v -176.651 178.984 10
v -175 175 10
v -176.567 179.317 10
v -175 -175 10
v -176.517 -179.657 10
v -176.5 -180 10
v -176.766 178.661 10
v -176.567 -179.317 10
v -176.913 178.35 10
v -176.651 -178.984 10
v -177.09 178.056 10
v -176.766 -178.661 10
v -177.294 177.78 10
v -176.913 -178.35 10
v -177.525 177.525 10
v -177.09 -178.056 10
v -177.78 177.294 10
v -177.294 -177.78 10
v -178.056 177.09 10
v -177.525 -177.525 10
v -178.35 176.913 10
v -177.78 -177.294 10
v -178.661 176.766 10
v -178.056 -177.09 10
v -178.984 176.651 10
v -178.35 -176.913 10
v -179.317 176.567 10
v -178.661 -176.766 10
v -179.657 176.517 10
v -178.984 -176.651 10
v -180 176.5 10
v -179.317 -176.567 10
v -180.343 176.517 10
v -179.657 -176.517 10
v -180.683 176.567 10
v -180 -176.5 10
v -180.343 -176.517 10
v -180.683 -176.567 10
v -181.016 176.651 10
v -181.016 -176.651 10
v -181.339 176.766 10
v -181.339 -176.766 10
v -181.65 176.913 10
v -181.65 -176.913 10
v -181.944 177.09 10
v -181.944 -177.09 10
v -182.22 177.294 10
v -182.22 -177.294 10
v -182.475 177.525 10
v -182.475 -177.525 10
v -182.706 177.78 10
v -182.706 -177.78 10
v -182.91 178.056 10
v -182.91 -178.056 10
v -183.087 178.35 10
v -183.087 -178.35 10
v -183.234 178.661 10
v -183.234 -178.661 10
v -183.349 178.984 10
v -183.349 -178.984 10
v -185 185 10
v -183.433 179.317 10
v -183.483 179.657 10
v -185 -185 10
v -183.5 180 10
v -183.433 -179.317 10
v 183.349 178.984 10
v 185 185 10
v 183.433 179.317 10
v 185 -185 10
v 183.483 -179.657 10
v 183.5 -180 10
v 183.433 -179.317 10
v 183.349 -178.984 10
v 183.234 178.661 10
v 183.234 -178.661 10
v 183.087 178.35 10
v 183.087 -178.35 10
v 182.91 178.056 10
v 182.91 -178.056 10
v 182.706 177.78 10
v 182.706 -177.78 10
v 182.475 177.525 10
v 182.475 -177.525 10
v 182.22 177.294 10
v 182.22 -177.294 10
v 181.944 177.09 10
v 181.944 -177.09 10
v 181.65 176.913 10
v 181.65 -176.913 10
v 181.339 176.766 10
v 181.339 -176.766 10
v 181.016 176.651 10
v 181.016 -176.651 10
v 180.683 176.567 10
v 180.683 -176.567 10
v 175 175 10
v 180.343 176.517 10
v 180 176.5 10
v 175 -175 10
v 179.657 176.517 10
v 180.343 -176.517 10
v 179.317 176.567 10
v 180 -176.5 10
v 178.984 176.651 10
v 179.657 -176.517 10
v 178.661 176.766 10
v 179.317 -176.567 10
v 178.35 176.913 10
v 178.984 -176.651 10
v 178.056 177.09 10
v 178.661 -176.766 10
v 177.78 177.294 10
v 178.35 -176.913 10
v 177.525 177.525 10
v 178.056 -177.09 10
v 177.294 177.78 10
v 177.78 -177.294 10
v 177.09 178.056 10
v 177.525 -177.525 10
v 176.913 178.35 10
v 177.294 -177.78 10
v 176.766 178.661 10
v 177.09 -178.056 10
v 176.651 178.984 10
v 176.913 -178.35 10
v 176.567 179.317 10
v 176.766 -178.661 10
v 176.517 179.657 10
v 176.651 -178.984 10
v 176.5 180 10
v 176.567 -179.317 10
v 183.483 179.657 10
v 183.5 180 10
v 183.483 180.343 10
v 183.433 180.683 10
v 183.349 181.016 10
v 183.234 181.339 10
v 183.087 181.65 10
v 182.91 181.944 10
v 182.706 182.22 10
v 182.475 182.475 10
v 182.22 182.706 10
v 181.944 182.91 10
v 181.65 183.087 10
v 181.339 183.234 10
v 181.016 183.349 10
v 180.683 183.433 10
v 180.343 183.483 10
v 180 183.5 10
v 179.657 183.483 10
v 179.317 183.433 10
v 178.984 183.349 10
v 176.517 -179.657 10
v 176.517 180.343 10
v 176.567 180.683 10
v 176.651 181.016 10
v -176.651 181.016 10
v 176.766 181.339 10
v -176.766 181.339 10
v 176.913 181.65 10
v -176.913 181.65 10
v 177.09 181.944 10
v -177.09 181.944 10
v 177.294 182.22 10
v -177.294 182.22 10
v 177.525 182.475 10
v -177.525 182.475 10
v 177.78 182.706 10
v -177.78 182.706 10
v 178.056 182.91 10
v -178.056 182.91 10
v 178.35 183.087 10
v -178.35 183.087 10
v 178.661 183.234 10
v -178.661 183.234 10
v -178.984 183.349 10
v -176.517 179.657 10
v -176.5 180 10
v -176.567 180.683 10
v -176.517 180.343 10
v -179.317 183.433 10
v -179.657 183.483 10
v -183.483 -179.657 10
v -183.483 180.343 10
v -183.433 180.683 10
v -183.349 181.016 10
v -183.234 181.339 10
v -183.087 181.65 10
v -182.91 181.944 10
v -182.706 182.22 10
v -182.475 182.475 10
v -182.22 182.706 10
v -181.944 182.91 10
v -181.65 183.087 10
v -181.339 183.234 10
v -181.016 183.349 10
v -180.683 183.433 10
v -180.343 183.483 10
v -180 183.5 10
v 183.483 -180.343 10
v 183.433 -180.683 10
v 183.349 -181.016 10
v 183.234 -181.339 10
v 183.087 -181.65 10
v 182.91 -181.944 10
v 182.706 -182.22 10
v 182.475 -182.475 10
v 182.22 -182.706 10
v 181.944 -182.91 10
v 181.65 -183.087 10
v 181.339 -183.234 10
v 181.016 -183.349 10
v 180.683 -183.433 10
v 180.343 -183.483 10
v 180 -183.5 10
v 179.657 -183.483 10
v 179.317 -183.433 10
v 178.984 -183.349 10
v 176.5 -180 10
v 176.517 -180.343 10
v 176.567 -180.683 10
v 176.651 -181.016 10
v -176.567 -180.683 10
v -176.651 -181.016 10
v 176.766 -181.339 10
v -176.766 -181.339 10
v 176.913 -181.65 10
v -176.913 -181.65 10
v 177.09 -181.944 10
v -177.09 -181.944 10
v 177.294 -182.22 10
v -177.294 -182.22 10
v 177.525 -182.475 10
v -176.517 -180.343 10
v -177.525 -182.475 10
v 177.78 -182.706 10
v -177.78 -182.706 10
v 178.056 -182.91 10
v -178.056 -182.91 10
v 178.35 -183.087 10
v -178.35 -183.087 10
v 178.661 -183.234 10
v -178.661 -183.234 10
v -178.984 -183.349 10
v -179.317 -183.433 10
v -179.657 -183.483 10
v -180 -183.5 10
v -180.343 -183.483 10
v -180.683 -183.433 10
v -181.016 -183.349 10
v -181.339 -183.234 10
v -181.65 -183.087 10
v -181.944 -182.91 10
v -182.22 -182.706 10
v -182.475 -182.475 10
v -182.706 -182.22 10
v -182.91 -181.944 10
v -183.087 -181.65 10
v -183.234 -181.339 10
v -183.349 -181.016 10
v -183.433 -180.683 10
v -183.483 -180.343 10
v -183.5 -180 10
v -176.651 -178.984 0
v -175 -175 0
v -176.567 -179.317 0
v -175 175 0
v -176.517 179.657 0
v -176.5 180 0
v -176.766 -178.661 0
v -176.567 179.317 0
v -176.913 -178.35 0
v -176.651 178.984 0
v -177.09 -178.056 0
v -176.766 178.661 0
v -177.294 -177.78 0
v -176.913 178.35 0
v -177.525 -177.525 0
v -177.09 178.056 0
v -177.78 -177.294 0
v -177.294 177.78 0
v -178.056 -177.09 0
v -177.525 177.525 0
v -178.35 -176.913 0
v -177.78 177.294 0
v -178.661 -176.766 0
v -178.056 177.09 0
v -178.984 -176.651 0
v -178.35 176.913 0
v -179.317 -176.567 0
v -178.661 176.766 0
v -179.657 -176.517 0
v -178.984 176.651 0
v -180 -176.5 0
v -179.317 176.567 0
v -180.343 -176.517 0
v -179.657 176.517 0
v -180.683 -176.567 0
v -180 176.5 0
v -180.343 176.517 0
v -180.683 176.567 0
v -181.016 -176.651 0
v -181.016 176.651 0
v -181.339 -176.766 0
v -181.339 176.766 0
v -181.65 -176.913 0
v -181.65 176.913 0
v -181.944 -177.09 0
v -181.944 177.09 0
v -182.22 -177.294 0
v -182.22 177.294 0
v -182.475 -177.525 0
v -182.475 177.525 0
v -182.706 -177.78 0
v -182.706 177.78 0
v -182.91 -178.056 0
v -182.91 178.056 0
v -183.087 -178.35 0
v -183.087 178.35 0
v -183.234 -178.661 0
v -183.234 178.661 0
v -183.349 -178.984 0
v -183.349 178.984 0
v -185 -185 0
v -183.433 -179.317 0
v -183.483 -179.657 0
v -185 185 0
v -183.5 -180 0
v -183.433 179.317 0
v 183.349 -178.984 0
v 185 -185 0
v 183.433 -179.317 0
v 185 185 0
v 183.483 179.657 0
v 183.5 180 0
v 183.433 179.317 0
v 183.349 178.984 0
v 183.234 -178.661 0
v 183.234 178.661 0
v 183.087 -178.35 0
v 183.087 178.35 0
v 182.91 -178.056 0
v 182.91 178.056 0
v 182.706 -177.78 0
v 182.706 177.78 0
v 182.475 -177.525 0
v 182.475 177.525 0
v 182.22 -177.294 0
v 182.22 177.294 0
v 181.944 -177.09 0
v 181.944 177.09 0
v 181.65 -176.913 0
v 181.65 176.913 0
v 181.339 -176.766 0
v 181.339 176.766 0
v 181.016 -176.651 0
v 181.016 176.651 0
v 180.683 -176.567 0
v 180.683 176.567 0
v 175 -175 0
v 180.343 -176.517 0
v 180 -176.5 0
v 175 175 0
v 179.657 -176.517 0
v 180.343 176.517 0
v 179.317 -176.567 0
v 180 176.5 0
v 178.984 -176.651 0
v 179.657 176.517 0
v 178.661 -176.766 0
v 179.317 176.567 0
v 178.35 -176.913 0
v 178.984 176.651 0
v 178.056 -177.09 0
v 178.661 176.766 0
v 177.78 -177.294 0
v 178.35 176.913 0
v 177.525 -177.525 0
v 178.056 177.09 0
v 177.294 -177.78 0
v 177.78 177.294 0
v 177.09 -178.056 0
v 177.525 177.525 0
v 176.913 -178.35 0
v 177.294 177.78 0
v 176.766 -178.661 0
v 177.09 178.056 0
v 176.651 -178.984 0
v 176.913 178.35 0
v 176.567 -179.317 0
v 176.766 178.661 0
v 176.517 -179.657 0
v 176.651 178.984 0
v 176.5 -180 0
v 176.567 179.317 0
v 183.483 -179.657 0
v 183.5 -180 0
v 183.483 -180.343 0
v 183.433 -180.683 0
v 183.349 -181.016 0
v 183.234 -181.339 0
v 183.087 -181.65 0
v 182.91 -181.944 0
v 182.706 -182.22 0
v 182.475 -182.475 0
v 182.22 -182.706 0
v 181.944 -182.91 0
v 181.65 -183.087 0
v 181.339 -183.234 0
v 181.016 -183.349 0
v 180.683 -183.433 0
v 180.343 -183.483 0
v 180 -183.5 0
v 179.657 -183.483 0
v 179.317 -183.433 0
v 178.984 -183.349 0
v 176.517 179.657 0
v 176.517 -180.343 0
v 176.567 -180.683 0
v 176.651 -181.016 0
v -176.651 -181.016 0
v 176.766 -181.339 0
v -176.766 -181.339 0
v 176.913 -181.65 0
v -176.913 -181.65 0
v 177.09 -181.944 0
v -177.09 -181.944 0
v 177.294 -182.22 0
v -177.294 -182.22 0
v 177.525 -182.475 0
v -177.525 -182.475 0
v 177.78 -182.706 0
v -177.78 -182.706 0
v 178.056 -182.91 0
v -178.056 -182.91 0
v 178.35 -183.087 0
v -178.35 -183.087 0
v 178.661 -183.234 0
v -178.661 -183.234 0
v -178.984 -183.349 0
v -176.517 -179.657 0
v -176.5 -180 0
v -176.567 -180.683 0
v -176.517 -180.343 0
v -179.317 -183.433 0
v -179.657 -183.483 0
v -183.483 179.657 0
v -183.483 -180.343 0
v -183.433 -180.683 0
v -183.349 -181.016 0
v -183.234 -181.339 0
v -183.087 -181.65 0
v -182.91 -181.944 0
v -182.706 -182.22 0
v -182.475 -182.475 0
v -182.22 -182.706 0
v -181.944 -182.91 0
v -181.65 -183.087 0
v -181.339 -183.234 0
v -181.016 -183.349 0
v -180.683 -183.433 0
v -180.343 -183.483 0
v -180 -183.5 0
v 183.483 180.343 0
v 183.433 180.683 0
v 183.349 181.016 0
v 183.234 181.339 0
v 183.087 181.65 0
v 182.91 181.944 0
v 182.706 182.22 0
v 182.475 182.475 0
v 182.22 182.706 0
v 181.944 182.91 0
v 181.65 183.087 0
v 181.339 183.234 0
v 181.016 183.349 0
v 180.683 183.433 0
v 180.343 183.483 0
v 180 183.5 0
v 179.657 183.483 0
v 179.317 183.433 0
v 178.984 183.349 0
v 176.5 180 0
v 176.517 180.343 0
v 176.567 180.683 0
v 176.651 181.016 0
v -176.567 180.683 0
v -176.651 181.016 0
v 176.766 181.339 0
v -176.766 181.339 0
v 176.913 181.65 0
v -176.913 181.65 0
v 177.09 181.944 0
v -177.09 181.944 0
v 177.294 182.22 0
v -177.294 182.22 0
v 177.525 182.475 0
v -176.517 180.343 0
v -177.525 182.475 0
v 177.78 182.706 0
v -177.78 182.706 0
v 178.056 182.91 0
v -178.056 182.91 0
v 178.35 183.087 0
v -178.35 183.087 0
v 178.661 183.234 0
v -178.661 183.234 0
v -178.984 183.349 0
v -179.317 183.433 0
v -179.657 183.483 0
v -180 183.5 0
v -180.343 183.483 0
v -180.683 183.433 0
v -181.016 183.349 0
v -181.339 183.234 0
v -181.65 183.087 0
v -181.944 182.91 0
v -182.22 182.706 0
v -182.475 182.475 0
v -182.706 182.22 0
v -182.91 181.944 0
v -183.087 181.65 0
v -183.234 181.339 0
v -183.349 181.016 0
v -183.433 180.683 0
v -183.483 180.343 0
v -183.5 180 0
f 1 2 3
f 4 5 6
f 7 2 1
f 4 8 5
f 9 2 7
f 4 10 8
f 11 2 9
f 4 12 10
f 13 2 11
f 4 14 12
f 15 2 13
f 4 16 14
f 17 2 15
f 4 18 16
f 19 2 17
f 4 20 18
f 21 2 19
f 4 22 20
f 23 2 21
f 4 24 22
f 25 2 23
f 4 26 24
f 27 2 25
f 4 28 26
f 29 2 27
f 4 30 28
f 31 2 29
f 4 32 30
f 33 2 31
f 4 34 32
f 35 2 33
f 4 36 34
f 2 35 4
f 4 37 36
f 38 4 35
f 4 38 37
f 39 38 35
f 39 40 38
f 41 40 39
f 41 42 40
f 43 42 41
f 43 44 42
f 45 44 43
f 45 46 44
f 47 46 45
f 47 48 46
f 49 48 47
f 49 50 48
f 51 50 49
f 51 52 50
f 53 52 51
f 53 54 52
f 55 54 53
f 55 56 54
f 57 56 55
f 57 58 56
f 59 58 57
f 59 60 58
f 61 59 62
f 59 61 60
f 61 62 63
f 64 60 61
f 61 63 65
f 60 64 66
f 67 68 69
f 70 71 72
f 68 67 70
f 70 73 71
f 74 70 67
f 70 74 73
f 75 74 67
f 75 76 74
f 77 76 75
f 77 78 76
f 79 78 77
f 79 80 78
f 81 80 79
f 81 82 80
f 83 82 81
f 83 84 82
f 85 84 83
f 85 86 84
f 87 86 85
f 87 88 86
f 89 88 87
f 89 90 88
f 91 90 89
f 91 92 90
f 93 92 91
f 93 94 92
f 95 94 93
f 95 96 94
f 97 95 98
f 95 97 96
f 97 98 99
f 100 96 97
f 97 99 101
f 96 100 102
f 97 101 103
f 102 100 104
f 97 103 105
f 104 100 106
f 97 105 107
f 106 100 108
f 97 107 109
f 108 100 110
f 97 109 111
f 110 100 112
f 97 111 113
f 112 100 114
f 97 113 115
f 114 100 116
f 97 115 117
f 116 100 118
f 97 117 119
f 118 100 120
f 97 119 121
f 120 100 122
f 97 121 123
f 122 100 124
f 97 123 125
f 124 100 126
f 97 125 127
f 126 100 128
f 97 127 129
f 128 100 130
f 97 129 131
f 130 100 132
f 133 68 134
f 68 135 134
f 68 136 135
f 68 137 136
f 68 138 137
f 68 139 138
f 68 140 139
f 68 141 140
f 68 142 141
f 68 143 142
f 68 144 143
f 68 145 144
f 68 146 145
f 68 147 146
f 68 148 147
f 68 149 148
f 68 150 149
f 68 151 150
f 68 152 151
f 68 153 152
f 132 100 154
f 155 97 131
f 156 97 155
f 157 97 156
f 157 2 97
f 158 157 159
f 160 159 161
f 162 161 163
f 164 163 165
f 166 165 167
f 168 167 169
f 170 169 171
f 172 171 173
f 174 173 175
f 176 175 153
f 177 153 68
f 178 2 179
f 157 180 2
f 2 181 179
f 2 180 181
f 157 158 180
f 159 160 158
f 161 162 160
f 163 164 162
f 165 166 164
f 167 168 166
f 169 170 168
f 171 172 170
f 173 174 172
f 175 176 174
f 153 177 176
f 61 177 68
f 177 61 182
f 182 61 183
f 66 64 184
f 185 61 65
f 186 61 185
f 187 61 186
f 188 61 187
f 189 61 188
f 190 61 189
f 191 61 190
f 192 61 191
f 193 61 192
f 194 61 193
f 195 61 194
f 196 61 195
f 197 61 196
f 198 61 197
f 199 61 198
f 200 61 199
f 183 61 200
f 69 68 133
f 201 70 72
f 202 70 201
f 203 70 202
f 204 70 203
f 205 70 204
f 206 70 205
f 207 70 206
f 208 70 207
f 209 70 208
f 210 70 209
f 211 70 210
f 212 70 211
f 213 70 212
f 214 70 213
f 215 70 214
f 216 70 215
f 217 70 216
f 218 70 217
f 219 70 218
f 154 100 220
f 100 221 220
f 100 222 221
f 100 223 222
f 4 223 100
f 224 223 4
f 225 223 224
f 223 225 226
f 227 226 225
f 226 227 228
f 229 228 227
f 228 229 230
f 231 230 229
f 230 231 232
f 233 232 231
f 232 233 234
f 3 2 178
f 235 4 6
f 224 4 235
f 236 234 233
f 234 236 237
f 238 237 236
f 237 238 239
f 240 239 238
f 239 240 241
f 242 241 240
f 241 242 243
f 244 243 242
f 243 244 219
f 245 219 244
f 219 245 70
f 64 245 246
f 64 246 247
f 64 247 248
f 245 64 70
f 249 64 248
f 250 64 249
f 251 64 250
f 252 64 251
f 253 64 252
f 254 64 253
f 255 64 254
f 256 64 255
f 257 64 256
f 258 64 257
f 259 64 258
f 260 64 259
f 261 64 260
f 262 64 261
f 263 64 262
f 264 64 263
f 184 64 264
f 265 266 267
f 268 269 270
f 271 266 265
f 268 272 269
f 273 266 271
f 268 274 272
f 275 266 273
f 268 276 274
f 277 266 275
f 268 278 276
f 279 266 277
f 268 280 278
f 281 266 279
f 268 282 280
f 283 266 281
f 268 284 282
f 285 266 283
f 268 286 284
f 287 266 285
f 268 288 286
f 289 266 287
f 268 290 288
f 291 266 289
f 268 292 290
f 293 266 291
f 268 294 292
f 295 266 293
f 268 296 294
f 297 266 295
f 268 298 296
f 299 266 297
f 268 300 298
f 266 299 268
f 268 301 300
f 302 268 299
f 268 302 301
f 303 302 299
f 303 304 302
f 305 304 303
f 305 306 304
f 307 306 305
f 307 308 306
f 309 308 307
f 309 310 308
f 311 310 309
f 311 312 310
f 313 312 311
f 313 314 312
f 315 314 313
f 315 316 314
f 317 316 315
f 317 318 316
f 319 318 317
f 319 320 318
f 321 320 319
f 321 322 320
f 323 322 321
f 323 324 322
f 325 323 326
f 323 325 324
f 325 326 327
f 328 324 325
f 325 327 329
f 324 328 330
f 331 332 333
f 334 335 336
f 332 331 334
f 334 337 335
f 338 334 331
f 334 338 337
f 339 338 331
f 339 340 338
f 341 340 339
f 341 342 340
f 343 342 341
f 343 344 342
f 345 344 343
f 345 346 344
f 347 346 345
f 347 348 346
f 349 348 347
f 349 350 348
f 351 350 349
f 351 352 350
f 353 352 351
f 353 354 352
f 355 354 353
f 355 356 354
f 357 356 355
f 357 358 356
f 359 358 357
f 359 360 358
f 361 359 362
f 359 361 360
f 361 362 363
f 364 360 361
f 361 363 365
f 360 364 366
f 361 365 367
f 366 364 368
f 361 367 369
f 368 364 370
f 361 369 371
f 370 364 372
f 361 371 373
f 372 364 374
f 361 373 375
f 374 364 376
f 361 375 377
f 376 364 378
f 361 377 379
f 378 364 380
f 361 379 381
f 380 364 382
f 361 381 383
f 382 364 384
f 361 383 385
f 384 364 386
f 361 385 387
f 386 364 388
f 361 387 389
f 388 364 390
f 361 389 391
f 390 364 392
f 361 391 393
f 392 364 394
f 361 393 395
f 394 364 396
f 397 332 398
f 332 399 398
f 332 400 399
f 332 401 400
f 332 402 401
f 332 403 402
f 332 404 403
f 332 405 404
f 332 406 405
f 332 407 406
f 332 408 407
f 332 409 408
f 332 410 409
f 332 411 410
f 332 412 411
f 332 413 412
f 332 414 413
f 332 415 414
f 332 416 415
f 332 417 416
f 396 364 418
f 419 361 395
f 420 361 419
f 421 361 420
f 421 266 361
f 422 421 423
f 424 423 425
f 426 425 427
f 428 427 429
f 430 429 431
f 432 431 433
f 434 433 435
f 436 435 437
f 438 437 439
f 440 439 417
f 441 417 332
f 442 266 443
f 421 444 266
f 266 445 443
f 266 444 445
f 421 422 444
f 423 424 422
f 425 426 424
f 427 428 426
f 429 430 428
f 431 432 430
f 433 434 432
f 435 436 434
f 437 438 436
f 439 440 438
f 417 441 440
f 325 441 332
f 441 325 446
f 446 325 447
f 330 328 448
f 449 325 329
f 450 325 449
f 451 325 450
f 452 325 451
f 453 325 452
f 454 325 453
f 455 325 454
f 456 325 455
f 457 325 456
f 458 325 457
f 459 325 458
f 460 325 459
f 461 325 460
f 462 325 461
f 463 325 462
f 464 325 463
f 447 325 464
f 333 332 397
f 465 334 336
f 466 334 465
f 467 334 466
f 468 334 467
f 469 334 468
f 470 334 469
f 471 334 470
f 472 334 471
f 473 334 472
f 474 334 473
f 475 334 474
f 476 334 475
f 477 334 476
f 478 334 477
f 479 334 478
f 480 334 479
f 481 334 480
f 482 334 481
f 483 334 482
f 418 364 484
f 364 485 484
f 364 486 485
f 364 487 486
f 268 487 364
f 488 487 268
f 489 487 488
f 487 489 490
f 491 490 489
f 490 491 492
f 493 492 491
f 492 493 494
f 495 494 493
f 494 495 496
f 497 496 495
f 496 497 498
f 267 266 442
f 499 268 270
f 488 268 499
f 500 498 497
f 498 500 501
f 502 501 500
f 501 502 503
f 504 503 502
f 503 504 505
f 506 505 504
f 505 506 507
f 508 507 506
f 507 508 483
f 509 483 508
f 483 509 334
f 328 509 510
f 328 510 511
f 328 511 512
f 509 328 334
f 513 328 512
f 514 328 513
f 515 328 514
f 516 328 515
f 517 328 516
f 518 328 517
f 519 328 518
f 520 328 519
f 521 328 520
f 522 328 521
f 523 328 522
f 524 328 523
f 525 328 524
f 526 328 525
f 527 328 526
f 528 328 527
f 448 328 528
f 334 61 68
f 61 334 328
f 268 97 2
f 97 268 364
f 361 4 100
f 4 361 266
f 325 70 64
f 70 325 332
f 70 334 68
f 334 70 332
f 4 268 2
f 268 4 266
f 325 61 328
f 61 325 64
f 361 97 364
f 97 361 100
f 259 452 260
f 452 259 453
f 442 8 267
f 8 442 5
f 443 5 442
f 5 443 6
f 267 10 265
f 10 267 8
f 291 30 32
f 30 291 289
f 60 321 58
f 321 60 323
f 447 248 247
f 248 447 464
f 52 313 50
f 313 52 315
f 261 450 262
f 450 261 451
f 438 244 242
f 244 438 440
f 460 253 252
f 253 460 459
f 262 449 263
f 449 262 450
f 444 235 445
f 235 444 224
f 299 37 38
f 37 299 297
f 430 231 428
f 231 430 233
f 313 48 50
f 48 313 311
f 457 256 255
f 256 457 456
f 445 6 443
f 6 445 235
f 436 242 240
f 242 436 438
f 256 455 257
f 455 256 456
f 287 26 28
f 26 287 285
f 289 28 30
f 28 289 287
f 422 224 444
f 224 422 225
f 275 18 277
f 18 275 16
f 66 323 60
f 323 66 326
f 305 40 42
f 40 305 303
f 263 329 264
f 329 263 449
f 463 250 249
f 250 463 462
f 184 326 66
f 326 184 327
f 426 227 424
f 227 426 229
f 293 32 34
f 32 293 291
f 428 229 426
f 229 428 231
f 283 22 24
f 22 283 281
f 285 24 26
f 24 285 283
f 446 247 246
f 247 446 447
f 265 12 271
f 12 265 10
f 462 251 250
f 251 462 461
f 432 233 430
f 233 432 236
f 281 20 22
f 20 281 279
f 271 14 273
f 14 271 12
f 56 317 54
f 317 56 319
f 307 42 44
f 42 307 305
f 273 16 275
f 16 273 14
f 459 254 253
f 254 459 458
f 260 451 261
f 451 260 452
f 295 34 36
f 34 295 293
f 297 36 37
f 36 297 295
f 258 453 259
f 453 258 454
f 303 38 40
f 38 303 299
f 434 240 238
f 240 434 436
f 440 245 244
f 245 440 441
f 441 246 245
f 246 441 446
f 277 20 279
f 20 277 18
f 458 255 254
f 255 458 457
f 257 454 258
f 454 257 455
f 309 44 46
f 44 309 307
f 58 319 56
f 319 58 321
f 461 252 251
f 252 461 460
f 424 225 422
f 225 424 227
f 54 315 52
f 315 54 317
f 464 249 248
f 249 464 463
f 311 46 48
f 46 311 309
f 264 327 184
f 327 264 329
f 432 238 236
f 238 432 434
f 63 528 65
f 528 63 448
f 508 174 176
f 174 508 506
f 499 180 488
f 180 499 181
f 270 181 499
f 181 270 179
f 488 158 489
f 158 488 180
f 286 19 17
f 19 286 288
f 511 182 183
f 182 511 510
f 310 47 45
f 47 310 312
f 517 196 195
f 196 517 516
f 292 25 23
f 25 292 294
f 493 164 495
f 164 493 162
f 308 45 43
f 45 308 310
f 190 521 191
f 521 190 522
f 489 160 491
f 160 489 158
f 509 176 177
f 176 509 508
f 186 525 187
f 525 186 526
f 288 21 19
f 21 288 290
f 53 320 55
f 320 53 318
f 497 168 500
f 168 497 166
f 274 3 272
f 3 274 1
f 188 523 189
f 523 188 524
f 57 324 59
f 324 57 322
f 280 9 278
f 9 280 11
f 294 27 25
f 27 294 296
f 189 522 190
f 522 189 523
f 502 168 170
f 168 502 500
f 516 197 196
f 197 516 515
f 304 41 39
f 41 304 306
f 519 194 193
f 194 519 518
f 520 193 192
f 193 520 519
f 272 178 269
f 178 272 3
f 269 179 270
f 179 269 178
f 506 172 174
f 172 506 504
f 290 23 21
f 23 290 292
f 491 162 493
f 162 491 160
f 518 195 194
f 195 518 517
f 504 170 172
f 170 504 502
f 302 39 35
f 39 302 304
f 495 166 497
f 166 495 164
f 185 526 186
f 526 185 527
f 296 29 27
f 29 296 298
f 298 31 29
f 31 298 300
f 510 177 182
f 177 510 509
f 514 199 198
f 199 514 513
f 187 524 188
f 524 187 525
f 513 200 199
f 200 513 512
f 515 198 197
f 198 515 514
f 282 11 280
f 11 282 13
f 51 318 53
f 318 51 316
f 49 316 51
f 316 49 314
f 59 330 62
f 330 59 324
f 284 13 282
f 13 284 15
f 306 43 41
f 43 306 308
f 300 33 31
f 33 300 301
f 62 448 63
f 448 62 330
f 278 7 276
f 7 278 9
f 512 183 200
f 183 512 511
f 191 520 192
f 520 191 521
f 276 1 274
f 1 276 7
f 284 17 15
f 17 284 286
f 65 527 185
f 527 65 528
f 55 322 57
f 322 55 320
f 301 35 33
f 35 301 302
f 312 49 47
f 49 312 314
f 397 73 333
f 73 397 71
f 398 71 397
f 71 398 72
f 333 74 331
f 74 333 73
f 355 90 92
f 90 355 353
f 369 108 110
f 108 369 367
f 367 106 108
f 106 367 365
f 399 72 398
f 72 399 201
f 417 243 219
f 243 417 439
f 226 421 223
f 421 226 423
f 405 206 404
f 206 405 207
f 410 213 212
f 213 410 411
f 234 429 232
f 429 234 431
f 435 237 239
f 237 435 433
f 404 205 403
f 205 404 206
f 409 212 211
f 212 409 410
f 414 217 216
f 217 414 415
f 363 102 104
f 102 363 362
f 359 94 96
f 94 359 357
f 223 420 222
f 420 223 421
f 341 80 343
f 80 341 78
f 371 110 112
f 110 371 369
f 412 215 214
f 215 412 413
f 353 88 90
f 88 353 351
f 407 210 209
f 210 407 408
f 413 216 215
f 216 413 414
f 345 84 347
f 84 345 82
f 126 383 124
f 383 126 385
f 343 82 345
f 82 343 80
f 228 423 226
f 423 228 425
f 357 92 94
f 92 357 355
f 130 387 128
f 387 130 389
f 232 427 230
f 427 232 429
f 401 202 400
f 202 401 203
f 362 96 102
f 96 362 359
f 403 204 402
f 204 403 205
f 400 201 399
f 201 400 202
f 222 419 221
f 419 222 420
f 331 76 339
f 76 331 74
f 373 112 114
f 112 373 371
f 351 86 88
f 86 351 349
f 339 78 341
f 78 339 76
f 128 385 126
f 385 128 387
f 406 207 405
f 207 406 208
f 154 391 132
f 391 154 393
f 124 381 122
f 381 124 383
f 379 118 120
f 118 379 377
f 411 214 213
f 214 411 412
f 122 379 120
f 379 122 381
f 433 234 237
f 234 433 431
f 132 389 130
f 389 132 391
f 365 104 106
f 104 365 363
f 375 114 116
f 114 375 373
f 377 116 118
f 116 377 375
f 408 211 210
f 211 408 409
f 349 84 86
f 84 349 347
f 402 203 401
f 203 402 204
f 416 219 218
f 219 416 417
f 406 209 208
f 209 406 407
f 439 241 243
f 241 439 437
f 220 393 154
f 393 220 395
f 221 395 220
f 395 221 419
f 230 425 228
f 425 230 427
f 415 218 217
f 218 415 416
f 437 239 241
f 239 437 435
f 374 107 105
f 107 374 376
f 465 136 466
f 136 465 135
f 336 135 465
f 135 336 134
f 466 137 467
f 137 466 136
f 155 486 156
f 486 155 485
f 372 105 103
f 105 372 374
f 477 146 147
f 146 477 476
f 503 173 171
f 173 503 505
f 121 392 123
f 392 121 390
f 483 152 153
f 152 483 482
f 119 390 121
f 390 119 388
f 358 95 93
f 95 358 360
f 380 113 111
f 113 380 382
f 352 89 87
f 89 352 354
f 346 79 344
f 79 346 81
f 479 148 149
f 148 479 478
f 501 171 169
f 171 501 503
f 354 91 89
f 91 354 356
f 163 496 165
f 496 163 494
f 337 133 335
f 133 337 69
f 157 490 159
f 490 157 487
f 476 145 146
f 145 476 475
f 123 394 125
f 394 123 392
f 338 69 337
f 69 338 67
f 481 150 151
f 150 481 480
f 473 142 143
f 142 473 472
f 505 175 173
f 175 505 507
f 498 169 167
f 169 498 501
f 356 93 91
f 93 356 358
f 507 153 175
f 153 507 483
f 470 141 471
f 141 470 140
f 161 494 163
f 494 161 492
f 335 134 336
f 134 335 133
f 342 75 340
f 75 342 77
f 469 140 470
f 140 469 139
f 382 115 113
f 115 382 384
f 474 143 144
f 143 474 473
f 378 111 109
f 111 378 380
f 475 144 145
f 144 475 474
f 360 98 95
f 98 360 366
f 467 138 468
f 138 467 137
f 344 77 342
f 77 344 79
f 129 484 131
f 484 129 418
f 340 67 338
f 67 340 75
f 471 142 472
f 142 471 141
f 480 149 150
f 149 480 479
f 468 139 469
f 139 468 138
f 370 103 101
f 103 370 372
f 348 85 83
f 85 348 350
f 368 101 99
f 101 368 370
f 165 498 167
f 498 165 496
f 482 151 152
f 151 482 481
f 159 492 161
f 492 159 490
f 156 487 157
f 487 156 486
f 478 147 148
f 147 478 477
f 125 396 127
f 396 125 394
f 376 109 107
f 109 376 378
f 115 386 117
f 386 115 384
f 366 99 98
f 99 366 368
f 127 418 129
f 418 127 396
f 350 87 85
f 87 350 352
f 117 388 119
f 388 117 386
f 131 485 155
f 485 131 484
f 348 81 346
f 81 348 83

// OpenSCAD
// ring_36.scad - ring index 36 (z bottom = 360 mm)
$fn = 64; bar = 10; half_b = bar/2; outer = 370; half_outer = outer/2;
front_y = 180; back_y = -180; left_x = -180; right_x = 180;
x_centers = [-170, -100, -30, 40, 110, 180];
z_centers = [5, 85, 155, 225, 295, 365, 435, 505, 575, 645, 715]; ring_z = 360;
module place_box(cx, cy, sx, sy) { translate([cx - sx/2, cy - sy/2, 0]) cube([sx, sy, bar]); }

difference() { union() {
    for (x = x_centers) { place_box(x, front_y, bar, bar); place_box(x, back_y, bar, bar); }
    for (y = x_centers) { place_box(left_x, y, bar, bar); place_box(right_x, y, bar, bar); }
    for (zc = z_centers) if ((zc - half_b < ring_z + bar) && (zc + half_b > ring_z)) {
        translate([-half_outer, front_y - half_b, 0]) cube([outer, bar, bar]);
        translate([-half_outer, back_y - half_b, 0])  cube([outer, bar, bar]);
        translate([left_x - half_b, -half_outer, 0])  cube([bar, outer, bar]);
        translate([right_x - half_b, -half_outer, 0]) cube([bar, outer, bar]);
    }
  }
  for (cx = [-180, 180]) for (cy = [-180, 180]) translate([cx, cy, 0]) cylinder(h = bar, r = 3.5, $fn = 64);
}
